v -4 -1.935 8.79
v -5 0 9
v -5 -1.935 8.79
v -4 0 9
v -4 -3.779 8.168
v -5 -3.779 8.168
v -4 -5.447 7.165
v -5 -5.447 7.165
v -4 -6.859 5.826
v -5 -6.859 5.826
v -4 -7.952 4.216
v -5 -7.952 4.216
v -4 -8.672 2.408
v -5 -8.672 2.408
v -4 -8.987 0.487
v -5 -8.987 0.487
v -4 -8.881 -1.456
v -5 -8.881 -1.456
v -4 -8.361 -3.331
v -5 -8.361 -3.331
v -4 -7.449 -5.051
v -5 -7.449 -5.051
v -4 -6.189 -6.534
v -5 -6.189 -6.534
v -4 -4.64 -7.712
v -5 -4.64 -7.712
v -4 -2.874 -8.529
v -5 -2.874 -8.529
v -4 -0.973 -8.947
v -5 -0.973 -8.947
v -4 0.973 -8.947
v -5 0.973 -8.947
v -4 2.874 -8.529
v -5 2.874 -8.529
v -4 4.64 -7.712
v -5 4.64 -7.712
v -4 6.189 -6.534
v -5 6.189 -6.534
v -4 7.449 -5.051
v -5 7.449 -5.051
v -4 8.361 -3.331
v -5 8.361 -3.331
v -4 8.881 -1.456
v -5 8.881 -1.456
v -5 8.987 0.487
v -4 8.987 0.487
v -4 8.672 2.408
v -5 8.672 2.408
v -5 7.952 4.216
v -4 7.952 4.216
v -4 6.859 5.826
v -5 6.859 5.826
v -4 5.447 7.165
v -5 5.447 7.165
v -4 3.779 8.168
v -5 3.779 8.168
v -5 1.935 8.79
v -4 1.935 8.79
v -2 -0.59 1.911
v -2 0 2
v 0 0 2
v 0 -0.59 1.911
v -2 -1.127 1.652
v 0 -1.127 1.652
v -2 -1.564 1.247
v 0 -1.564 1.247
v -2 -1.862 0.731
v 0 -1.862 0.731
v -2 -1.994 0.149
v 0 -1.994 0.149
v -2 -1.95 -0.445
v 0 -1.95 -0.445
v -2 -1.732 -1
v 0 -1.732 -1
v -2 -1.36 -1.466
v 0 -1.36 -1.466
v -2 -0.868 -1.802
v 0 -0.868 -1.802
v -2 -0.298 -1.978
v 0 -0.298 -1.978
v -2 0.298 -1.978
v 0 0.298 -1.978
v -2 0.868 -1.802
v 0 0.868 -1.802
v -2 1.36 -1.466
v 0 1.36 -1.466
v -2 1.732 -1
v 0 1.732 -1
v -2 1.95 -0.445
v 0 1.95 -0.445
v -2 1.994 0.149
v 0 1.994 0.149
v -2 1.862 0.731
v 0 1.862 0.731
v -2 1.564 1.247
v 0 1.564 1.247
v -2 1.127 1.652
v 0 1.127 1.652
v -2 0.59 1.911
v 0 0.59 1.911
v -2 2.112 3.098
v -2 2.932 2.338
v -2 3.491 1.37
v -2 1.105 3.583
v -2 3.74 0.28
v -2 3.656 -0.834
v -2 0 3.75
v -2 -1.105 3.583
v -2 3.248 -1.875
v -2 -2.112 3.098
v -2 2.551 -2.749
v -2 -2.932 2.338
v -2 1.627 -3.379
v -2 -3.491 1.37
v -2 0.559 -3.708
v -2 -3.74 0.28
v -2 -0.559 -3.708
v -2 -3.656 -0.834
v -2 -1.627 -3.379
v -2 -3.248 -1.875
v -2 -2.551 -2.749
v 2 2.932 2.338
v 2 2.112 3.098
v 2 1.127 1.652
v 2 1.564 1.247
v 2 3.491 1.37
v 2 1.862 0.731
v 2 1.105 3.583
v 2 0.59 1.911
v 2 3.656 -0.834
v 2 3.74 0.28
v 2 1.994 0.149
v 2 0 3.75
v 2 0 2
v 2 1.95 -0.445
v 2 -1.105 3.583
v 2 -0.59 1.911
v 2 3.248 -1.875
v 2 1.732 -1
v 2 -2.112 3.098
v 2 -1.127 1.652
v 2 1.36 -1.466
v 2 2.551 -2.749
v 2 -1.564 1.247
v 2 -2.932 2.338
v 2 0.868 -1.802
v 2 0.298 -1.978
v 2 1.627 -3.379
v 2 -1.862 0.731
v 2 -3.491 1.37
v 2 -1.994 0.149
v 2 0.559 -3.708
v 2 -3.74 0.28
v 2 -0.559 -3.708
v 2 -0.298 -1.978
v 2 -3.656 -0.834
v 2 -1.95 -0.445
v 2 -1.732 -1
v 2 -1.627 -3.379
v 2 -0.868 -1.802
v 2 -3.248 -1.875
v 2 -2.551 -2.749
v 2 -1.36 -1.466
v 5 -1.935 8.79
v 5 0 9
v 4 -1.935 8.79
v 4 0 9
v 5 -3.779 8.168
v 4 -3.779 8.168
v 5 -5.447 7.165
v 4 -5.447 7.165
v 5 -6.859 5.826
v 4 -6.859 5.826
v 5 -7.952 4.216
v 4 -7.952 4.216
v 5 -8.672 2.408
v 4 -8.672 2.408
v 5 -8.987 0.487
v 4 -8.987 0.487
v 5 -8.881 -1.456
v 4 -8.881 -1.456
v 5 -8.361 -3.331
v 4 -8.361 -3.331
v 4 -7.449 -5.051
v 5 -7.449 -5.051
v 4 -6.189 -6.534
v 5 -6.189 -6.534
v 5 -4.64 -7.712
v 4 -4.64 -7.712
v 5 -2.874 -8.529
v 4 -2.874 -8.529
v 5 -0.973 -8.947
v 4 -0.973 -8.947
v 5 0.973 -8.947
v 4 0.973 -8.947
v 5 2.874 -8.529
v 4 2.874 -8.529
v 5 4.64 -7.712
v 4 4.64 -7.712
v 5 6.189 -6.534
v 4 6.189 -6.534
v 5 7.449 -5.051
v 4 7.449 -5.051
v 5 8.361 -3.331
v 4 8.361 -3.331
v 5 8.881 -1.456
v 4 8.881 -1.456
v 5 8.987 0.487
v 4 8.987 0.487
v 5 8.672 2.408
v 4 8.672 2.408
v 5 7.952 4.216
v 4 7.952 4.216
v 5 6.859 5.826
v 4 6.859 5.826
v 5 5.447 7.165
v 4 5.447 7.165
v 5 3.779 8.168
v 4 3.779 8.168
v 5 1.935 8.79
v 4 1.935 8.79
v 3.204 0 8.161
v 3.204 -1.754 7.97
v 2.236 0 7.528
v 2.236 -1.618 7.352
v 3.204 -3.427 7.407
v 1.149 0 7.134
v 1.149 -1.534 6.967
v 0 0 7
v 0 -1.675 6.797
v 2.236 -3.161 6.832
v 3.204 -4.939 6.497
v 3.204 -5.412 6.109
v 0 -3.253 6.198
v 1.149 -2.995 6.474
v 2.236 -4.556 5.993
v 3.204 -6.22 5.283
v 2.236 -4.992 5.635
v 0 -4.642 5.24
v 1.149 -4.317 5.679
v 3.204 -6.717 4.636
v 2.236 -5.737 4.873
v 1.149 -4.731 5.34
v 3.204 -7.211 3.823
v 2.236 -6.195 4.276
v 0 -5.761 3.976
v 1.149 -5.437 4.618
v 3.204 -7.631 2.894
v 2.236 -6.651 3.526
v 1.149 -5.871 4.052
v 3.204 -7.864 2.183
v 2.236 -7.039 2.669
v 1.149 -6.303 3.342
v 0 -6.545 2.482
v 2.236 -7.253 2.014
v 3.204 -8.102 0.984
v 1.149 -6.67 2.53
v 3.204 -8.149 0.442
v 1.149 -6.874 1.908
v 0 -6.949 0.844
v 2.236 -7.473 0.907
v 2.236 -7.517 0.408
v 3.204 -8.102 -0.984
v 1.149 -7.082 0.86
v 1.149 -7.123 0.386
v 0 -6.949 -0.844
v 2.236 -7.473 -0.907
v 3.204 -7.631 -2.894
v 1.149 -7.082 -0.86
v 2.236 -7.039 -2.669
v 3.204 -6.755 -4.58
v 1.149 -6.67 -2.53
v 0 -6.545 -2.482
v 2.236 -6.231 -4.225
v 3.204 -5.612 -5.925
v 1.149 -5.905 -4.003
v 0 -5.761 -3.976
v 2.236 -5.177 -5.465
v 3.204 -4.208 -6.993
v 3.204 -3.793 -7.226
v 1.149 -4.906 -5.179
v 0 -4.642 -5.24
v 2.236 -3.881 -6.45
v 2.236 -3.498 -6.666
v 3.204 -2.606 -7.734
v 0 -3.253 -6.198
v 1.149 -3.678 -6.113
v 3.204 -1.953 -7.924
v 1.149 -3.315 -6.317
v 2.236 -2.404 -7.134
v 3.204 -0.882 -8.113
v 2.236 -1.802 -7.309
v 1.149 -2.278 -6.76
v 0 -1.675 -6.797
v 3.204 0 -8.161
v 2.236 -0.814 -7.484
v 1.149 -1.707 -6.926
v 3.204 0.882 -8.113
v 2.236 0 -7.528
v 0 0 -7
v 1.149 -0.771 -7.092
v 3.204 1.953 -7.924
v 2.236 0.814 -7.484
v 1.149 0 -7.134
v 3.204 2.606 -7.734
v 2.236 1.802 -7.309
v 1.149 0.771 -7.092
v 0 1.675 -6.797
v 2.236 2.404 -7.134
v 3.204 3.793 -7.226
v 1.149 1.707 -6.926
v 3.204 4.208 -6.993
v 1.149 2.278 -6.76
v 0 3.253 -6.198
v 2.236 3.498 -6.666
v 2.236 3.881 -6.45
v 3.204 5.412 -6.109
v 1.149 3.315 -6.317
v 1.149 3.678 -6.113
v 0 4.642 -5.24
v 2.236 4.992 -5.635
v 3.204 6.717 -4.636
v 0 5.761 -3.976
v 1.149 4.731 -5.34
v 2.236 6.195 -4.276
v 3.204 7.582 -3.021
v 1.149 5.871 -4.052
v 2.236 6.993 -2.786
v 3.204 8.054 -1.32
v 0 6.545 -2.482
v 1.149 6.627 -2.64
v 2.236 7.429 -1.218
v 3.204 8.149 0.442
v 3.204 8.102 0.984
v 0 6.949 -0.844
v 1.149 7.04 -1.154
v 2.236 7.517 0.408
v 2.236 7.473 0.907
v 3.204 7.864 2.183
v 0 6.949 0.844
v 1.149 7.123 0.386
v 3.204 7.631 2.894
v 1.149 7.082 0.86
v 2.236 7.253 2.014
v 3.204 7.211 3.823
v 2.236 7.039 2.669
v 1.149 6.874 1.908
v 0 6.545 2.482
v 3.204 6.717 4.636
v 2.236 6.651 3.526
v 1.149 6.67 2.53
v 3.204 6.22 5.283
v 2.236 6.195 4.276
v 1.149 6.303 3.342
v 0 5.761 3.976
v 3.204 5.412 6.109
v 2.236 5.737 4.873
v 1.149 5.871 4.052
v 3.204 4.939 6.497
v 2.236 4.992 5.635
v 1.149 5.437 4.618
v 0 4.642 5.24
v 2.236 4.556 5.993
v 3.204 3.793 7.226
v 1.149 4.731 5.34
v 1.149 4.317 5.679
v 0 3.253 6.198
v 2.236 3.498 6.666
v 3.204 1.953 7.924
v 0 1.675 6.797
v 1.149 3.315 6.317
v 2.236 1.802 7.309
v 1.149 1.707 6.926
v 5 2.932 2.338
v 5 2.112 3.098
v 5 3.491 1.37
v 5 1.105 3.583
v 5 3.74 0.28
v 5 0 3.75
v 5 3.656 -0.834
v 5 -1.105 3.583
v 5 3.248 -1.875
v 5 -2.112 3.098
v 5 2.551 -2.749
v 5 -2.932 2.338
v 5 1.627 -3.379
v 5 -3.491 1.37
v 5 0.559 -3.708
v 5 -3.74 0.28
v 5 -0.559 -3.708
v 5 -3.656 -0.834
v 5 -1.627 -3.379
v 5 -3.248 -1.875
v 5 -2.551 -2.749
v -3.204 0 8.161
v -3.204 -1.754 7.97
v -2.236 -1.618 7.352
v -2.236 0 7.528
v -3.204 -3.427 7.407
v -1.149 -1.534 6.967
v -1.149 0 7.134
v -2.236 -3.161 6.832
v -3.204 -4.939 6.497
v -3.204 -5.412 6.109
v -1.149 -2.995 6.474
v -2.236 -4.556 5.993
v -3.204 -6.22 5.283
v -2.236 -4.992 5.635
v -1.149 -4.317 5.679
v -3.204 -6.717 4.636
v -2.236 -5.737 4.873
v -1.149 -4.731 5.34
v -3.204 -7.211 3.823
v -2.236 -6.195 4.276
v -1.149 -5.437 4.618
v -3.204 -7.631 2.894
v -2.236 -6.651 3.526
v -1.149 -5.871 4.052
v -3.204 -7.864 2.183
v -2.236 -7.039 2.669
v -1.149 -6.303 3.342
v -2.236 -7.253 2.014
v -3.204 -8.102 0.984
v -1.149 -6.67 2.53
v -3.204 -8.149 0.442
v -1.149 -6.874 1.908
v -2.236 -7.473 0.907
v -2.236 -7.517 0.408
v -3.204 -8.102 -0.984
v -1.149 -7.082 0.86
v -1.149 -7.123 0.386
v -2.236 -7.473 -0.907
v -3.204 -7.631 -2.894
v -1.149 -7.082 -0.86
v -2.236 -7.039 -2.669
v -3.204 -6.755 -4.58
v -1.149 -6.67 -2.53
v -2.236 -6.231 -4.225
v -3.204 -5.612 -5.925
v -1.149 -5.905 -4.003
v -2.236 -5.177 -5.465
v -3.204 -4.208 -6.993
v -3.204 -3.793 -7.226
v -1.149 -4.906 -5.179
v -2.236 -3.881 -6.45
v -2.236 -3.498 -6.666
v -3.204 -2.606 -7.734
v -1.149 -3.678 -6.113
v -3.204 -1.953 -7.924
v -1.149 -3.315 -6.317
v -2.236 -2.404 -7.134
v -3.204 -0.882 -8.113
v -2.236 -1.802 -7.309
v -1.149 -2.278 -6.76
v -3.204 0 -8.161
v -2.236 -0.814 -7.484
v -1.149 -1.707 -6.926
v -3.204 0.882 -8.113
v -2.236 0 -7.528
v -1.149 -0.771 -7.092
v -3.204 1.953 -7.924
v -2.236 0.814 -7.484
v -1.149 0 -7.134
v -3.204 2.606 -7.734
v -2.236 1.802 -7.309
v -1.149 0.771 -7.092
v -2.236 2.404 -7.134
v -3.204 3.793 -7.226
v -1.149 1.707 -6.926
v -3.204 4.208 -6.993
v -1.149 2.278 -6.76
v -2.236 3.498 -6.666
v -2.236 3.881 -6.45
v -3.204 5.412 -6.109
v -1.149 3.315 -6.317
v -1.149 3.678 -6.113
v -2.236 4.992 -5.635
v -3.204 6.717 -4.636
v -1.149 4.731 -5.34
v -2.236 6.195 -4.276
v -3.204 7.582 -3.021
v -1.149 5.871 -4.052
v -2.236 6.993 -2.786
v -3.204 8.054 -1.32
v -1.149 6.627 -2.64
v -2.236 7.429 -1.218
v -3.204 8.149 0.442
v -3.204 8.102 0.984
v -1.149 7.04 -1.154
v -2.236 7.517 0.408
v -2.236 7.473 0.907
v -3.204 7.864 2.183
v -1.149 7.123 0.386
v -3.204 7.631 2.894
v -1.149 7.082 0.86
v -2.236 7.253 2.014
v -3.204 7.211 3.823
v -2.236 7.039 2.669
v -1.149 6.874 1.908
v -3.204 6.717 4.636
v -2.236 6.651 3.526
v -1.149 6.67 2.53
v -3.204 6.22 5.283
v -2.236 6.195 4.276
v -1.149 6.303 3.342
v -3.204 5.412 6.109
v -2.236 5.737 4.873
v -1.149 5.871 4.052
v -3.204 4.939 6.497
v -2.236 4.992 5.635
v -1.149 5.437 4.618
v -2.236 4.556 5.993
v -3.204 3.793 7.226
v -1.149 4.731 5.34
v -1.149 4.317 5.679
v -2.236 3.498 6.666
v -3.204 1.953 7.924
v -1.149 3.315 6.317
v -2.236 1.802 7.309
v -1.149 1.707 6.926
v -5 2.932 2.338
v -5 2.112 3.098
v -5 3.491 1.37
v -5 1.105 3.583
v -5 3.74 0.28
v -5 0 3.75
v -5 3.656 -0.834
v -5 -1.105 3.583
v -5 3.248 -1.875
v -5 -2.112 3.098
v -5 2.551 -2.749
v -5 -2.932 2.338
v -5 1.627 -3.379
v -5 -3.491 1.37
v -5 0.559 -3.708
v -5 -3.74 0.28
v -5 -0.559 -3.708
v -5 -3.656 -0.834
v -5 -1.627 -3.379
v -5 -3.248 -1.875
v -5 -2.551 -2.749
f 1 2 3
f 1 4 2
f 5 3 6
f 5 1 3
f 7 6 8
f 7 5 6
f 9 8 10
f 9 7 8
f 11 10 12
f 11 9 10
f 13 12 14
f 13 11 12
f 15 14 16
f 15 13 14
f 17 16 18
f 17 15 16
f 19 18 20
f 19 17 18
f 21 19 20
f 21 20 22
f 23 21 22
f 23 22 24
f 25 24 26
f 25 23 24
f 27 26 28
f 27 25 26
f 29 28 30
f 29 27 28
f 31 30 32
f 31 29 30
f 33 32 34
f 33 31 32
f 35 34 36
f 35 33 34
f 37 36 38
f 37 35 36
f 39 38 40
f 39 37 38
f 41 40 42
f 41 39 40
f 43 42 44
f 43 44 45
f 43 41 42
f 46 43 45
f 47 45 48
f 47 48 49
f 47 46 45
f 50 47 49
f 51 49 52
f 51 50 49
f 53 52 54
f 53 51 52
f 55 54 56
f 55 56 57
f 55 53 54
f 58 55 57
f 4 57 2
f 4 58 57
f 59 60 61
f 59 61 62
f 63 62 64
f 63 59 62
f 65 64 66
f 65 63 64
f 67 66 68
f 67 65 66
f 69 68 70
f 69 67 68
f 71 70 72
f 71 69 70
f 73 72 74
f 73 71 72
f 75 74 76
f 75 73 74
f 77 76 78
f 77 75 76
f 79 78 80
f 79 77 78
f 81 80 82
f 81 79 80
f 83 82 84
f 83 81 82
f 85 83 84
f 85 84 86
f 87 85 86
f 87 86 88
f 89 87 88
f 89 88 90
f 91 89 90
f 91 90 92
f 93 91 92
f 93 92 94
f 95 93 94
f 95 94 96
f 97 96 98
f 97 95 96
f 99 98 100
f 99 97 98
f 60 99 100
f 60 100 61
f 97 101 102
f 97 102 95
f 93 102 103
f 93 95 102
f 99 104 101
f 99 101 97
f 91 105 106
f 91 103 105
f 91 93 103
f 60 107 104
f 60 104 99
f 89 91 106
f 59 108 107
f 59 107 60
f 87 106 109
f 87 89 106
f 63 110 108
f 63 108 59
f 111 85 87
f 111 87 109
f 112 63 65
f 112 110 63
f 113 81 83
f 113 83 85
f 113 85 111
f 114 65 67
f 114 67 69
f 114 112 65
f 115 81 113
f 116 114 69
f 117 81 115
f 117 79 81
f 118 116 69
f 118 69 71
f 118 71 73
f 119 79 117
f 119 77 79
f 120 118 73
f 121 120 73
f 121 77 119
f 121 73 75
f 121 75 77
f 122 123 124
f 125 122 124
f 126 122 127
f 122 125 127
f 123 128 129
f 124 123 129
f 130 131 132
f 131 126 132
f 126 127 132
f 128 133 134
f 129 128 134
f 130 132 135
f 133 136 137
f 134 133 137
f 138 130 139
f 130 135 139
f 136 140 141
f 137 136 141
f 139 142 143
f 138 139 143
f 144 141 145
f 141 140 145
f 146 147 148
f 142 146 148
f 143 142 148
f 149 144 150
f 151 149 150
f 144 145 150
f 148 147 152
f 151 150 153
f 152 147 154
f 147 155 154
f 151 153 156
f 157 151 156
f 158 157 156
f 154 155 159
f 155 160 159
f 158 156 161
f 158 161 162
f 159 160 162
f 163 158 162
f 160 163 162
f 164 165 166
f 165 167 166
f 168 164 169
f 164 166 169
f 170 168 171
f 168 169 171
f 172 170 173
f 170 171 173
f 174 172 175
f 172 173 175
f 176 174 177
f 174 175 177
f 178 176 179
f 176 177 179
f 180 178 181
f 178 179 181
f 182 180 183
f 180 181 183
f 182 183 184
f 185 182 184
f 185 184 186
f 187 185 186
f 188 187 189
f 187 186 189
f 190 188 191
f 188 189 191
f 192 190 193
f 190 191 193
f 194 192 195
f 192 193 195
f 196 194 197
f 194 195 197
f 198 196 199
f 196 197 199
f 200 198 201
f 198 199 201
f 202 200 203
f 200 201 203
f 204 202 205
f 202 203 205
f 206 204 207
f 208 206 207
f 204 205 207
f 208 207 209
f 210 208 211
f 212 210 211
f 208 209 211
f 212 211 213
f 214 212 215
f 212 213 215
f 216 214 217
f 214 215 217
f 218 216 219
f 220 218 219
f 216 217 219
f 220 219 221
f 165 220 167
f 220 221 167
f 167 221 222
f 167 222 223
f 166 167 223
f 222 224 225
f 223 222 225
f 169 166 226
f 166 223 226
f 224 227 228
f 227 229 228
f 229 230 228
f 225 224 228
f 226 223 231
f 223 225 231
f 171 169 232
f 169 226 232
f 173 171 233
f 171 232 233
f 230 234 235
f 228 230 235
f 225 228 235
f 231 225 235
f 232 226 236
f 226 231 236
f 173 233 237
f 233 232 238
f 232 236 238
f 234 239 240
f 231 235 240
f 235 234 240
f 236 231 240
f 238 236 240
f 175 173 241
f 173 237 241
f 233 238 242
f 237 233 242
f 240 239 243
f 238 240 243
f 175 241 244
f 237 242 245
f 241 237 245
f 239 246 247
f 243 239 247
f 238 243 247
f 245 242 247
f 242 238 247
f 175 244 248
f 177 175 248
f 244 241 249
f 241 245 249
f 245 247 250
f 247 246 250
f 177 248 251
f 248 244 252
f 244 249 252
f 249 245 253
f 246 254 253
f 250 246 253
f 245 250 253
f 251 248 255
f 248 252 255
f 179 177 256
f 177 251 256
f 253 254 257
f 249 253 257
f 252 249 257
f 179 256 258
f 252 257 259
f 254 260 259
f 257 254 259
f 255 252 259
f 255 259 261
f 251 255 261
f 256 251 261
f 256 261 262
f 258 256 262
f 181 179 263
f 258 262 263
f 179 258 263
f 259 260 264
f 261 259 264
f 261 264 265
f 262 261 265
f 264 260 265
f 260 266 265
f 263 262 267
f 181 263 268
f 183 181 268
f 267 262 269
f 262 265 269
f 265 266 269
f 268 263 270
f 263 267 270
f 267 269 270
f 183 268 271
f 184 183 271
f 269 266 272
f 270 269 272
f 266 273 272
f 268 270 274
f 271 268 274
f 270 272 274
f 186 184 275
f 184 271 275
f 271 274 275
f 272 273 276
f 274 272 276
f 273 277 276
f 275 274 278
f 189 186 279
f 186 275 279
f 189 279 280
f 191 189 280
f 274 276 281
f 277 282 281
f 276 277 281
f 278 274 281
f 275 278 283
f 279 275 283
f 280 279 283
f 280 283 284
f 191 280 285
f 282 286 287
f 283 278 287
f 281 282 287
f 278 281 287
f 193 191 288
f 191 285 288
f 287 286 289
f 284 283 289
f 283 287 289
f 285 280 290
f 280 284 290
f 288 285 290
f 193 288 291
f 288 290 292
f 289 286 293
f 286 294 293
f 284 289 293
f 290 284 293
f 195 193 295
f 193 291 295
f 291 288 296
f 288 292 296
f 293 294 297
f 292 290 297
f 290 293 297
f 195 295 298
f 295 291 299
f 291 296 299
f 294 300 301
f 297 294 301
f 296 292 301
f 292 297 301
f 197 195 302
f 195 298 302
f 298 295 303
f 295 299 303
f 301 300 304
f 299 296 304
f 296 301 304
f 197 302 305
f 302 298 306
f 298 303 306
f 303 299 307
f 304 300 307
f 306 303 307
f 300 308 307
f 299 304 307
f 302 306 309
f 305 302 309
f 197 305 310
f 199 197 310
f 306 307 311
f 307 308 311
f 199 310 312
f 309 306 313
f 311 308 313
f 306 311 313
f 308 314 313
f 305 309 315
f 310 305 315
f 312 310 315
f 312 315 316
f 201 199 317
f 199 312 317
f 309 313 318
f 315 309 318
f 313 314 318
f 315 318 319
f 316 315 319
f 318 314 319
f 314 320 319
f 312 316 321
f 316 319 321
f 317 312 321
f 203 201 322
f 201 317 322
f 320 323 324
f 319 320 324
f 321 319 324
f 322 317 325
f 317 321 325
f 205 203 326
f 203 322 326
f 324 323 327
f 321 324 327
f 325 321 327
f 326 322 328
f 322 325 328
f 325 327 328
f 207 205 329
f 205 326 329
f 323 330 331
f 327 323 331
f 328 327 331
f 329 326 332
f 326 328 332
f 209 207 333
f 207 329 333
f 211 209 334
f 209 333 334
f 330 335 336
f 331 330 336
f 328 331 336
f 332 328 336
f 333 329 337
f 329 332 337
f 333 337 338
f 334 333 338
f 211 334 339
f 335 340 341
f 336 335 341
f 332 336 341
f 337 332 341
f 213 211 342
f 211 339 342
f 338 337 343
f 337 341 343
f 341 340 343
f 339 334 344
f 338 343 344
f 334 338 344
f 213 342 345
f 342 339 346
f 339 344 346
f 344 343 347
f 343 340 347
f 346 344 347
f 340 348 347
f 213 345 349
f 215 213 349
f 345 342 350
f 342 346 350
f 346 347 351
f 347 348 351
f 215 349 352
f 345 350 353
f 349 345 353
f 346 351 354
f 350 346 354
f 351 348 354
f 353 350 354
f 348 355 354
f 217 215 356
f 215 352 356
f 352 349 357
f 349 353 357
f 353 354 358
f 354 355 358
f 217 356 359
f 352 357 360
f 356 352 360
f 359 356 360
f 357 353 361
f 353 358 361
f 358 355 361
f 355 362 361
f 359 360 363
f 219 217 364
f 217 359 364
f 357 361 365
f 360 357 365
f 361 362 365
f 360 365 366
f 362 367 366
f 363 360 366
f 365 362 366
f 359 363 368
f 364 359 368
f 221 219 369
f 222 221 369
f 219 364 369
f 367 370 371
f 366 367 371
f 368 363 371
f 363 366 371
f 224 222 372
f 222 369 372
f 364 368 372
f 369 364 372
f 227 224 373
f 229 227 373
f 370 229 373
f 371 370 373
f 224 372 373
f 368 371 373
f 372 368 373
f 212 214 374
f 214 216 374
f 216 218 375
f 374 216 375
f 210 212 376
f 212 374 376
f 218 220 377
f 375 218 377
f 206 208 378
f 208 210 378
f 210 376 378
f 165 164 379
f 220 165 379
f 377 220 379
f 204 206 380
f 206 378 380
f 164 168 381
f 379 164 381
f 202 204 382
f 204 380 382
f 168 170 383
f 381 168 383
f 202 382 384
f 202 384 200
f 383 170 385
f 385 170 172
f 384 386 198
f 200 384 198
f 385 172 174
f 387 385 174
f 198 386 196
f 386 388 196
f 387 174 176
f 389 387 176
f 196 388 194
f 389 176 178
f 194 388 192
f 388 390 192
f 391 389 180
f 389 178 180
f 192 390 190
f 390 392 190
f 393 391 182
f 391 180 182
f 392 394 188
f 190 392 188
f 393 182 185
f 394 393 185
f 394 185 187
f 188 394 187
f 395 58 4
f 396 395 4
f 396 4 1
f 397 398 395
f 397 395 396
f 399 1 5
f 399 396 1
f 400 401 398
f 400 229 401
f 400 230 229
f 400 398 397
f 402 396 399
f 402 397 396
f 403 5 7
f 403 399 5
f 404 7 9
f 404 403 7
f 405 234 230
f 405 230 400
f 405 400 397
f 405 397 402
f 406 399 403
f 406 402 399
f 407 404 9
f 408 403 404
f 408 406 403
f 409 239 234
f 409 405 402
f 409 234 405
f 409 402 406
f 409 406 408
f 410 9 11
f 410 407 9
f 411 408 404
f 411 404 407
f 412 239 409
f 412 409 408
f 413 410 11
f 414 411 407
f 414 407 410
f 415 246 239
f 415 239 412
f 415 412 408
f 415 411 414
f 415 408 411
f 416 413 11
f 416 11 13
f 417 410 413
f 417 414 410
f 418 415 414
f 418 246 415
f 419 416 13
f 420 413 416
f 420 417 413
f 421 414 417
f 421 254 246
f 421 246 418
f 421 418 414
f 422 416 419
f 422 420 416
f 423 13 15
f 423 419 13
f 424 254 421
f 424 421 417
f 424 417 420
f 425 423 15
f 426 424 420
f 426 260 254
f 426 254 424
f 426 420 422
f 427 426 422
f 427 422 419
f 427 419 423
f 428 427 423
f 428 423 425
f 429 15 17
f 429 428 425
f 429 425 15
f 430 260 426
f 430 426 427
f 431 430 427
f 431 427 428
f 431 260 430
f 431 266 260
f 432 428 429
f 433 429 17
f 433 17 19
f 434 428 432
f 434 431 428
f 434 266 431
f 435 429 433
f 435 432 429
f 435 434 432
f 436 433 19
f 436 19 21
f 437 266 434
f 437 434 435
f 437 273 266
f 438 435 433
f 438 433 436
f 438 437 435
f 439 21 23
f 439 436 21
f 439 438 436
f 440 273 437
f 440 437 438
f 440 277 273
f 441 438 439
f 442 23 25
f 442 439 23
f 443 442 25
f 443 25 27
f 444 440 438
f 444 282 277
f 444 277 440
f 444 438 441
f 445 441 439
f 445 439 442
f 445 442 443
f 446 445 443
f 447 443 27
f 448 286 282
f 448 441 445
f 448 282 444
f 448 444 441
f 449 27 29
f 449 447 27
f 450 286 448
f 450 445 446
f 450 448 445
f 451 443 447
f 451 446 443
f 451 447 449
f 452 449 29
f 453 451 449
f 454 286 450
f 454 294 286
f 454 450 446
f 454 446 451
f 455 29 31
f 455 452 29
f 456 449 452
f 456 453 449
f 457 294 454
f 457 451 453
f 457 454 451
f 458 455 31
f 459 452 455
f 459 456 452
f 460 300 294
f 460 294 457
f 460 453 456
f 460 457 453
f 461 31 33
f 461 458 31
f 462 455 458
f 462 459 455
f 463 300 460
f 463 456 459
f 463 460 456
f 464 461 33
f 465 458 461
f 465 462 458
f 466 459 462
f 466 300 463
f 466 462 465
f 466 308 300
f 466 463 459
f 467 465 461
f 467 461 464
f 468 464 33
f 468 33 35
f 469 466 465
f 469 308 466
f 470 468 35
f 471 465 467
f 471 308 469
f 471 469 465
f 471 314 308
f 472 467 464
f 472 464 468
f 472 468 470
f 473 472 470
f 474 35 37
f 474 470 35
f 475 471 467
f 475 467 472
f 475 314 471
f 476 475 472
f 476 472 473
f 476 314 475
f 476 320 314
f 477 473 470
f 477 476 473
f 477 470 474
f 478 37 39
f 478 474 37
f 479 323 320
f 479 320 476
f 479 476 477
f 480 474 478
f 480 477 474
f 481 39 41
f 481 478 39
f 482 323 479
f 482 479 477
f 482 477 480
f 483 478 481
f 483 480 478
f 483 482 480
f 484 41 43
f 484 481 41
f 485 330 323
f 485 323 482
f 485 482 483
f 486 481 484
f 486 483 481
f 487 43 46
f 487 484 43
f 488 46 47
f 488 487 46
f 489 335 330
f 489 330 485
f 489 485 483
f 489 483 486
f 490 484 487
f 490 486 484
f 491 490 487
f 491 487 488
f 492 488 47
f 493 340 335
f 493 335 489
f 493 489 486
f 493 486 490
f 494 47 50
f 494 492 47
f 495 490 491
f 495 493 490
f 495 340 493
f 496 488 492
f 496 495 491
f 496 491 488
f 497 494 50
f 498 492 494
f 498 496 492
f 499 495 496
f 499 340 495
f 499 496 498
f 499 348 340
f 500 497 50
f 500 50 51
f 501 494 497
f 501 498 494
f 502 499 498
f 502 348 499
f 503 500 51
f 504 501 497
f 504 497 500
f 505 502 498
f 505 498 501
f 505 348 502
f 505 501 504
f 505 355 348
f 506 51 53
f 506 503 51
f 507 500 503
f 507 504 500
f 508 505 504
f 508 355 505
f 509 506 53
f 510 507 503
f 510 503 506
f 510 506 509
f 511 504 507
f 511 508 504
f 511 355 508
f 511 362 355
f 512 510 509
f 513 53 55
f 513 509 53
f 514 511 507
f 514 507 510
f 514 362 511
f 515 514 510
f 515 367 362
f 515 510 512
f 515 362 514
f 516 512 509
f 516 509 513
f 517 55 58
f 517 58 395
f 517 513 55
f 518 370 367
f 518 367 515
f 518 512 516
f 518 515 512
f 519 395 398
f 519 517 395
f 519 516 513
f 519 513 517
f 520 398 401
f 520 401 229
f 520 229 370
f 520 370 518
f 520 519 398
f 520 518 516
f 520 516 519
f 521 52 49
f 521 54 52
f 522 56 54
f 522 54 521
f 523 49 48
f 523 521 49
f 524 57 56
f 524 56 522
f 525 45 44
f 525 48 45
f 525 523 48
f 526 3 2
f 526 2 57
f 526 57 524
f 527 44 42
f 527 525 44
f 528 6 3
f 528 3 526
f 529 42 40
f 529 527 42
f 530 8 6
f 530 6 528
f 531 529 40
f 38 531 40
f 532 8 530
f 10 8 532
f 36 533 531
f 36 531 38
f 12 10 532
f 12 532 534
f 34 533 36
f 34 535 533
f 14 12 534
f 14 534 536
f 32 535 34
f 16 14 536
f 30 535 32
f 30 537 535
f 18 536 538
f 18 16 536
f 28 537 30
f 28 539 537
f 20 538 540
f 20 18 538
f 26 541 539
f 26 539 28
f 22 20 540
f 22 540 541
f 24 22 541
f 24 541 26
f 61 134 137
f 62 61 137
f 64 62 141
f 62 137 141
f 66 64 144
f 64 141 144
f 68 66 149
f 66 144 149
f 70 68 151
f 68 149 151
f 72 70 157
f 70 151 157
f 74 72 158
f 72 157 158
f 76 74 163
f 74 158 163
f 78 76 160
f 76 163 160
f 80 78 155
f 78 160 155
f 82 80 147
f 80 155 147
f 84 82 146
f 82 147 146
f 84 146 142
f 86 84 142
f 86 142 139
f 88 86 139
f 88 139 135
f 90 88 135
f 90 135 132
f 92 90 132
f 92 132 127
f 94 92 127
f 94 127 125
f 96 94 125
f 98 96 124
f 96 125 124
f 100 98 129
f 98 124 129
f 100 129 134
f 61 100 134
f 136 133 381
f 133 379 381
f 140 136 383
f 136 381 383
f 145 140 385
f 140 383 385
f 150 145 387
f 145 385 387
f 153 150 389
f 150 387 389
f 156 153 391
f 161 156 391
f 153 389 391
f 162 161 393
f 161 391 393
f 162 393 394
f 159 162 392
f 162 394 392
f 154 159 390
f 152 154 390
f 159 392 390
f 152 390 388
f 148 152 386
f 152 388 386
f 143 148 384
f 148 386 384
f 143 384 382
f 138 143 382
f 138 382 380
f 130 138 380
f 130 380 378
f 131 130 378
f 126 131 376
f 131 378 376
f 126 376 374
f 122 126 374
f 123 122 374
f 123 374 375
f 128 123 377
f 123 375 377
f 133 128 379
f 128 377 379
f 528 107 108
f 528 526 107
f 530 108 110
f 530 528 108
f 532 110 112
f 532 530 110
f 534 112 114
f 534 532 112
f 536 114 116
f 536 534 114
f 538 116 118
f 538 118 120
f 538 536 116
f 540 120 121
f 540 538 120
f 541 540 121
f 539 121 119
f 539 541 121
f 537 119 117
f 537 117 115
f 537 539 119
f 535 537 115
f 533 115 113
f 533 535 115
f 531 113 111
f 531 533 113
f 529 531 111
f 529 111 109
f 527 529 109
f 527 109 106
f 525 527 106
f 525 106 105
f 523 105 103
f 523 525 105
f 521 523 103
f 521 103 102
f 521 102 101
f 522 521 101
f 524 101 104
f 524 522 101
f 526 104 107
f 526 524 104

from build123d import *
from build123d.topology import SkipClean


with BuildPart() as part:
    # Sketch1 → Revolve1 (revolve)
    with BuildSketch(Plane.XY, mode=Mode.PRIVATE) as revolve1_sk:
        with BuildLine():
            Line((0, 2), (2, 2))
            Line((2, 2), (2, 3.75))
            Line((2, 3.75), (5, 3.75))
            Line((5, 3.75), (5, 9))
            Line((5, 9), (4, 9))
            ThreePointArc((4, 9), (2.236067977, 7.527864045), (0, 7))
            Line((0, 7), (0, 2))
        make_face()
    revolve1 = revolve(revolve1_sk.sketch.rotate(Axis((0, 0, 0), (1, 0, 0)), 90), axis=Axis((0, 0, 0), (1, 0, 0)))

    # Mirror1: Revolve1 across plane
    with SkipClean():  # the faces are left unmerged after this step: merging them gives an invalid solid
        add(revolve1.mirror(Plane(origin=(0, 2, 0), x_dir=(0, 0, 1), z_dir=(1, 0, 0))))


solid = part.part
